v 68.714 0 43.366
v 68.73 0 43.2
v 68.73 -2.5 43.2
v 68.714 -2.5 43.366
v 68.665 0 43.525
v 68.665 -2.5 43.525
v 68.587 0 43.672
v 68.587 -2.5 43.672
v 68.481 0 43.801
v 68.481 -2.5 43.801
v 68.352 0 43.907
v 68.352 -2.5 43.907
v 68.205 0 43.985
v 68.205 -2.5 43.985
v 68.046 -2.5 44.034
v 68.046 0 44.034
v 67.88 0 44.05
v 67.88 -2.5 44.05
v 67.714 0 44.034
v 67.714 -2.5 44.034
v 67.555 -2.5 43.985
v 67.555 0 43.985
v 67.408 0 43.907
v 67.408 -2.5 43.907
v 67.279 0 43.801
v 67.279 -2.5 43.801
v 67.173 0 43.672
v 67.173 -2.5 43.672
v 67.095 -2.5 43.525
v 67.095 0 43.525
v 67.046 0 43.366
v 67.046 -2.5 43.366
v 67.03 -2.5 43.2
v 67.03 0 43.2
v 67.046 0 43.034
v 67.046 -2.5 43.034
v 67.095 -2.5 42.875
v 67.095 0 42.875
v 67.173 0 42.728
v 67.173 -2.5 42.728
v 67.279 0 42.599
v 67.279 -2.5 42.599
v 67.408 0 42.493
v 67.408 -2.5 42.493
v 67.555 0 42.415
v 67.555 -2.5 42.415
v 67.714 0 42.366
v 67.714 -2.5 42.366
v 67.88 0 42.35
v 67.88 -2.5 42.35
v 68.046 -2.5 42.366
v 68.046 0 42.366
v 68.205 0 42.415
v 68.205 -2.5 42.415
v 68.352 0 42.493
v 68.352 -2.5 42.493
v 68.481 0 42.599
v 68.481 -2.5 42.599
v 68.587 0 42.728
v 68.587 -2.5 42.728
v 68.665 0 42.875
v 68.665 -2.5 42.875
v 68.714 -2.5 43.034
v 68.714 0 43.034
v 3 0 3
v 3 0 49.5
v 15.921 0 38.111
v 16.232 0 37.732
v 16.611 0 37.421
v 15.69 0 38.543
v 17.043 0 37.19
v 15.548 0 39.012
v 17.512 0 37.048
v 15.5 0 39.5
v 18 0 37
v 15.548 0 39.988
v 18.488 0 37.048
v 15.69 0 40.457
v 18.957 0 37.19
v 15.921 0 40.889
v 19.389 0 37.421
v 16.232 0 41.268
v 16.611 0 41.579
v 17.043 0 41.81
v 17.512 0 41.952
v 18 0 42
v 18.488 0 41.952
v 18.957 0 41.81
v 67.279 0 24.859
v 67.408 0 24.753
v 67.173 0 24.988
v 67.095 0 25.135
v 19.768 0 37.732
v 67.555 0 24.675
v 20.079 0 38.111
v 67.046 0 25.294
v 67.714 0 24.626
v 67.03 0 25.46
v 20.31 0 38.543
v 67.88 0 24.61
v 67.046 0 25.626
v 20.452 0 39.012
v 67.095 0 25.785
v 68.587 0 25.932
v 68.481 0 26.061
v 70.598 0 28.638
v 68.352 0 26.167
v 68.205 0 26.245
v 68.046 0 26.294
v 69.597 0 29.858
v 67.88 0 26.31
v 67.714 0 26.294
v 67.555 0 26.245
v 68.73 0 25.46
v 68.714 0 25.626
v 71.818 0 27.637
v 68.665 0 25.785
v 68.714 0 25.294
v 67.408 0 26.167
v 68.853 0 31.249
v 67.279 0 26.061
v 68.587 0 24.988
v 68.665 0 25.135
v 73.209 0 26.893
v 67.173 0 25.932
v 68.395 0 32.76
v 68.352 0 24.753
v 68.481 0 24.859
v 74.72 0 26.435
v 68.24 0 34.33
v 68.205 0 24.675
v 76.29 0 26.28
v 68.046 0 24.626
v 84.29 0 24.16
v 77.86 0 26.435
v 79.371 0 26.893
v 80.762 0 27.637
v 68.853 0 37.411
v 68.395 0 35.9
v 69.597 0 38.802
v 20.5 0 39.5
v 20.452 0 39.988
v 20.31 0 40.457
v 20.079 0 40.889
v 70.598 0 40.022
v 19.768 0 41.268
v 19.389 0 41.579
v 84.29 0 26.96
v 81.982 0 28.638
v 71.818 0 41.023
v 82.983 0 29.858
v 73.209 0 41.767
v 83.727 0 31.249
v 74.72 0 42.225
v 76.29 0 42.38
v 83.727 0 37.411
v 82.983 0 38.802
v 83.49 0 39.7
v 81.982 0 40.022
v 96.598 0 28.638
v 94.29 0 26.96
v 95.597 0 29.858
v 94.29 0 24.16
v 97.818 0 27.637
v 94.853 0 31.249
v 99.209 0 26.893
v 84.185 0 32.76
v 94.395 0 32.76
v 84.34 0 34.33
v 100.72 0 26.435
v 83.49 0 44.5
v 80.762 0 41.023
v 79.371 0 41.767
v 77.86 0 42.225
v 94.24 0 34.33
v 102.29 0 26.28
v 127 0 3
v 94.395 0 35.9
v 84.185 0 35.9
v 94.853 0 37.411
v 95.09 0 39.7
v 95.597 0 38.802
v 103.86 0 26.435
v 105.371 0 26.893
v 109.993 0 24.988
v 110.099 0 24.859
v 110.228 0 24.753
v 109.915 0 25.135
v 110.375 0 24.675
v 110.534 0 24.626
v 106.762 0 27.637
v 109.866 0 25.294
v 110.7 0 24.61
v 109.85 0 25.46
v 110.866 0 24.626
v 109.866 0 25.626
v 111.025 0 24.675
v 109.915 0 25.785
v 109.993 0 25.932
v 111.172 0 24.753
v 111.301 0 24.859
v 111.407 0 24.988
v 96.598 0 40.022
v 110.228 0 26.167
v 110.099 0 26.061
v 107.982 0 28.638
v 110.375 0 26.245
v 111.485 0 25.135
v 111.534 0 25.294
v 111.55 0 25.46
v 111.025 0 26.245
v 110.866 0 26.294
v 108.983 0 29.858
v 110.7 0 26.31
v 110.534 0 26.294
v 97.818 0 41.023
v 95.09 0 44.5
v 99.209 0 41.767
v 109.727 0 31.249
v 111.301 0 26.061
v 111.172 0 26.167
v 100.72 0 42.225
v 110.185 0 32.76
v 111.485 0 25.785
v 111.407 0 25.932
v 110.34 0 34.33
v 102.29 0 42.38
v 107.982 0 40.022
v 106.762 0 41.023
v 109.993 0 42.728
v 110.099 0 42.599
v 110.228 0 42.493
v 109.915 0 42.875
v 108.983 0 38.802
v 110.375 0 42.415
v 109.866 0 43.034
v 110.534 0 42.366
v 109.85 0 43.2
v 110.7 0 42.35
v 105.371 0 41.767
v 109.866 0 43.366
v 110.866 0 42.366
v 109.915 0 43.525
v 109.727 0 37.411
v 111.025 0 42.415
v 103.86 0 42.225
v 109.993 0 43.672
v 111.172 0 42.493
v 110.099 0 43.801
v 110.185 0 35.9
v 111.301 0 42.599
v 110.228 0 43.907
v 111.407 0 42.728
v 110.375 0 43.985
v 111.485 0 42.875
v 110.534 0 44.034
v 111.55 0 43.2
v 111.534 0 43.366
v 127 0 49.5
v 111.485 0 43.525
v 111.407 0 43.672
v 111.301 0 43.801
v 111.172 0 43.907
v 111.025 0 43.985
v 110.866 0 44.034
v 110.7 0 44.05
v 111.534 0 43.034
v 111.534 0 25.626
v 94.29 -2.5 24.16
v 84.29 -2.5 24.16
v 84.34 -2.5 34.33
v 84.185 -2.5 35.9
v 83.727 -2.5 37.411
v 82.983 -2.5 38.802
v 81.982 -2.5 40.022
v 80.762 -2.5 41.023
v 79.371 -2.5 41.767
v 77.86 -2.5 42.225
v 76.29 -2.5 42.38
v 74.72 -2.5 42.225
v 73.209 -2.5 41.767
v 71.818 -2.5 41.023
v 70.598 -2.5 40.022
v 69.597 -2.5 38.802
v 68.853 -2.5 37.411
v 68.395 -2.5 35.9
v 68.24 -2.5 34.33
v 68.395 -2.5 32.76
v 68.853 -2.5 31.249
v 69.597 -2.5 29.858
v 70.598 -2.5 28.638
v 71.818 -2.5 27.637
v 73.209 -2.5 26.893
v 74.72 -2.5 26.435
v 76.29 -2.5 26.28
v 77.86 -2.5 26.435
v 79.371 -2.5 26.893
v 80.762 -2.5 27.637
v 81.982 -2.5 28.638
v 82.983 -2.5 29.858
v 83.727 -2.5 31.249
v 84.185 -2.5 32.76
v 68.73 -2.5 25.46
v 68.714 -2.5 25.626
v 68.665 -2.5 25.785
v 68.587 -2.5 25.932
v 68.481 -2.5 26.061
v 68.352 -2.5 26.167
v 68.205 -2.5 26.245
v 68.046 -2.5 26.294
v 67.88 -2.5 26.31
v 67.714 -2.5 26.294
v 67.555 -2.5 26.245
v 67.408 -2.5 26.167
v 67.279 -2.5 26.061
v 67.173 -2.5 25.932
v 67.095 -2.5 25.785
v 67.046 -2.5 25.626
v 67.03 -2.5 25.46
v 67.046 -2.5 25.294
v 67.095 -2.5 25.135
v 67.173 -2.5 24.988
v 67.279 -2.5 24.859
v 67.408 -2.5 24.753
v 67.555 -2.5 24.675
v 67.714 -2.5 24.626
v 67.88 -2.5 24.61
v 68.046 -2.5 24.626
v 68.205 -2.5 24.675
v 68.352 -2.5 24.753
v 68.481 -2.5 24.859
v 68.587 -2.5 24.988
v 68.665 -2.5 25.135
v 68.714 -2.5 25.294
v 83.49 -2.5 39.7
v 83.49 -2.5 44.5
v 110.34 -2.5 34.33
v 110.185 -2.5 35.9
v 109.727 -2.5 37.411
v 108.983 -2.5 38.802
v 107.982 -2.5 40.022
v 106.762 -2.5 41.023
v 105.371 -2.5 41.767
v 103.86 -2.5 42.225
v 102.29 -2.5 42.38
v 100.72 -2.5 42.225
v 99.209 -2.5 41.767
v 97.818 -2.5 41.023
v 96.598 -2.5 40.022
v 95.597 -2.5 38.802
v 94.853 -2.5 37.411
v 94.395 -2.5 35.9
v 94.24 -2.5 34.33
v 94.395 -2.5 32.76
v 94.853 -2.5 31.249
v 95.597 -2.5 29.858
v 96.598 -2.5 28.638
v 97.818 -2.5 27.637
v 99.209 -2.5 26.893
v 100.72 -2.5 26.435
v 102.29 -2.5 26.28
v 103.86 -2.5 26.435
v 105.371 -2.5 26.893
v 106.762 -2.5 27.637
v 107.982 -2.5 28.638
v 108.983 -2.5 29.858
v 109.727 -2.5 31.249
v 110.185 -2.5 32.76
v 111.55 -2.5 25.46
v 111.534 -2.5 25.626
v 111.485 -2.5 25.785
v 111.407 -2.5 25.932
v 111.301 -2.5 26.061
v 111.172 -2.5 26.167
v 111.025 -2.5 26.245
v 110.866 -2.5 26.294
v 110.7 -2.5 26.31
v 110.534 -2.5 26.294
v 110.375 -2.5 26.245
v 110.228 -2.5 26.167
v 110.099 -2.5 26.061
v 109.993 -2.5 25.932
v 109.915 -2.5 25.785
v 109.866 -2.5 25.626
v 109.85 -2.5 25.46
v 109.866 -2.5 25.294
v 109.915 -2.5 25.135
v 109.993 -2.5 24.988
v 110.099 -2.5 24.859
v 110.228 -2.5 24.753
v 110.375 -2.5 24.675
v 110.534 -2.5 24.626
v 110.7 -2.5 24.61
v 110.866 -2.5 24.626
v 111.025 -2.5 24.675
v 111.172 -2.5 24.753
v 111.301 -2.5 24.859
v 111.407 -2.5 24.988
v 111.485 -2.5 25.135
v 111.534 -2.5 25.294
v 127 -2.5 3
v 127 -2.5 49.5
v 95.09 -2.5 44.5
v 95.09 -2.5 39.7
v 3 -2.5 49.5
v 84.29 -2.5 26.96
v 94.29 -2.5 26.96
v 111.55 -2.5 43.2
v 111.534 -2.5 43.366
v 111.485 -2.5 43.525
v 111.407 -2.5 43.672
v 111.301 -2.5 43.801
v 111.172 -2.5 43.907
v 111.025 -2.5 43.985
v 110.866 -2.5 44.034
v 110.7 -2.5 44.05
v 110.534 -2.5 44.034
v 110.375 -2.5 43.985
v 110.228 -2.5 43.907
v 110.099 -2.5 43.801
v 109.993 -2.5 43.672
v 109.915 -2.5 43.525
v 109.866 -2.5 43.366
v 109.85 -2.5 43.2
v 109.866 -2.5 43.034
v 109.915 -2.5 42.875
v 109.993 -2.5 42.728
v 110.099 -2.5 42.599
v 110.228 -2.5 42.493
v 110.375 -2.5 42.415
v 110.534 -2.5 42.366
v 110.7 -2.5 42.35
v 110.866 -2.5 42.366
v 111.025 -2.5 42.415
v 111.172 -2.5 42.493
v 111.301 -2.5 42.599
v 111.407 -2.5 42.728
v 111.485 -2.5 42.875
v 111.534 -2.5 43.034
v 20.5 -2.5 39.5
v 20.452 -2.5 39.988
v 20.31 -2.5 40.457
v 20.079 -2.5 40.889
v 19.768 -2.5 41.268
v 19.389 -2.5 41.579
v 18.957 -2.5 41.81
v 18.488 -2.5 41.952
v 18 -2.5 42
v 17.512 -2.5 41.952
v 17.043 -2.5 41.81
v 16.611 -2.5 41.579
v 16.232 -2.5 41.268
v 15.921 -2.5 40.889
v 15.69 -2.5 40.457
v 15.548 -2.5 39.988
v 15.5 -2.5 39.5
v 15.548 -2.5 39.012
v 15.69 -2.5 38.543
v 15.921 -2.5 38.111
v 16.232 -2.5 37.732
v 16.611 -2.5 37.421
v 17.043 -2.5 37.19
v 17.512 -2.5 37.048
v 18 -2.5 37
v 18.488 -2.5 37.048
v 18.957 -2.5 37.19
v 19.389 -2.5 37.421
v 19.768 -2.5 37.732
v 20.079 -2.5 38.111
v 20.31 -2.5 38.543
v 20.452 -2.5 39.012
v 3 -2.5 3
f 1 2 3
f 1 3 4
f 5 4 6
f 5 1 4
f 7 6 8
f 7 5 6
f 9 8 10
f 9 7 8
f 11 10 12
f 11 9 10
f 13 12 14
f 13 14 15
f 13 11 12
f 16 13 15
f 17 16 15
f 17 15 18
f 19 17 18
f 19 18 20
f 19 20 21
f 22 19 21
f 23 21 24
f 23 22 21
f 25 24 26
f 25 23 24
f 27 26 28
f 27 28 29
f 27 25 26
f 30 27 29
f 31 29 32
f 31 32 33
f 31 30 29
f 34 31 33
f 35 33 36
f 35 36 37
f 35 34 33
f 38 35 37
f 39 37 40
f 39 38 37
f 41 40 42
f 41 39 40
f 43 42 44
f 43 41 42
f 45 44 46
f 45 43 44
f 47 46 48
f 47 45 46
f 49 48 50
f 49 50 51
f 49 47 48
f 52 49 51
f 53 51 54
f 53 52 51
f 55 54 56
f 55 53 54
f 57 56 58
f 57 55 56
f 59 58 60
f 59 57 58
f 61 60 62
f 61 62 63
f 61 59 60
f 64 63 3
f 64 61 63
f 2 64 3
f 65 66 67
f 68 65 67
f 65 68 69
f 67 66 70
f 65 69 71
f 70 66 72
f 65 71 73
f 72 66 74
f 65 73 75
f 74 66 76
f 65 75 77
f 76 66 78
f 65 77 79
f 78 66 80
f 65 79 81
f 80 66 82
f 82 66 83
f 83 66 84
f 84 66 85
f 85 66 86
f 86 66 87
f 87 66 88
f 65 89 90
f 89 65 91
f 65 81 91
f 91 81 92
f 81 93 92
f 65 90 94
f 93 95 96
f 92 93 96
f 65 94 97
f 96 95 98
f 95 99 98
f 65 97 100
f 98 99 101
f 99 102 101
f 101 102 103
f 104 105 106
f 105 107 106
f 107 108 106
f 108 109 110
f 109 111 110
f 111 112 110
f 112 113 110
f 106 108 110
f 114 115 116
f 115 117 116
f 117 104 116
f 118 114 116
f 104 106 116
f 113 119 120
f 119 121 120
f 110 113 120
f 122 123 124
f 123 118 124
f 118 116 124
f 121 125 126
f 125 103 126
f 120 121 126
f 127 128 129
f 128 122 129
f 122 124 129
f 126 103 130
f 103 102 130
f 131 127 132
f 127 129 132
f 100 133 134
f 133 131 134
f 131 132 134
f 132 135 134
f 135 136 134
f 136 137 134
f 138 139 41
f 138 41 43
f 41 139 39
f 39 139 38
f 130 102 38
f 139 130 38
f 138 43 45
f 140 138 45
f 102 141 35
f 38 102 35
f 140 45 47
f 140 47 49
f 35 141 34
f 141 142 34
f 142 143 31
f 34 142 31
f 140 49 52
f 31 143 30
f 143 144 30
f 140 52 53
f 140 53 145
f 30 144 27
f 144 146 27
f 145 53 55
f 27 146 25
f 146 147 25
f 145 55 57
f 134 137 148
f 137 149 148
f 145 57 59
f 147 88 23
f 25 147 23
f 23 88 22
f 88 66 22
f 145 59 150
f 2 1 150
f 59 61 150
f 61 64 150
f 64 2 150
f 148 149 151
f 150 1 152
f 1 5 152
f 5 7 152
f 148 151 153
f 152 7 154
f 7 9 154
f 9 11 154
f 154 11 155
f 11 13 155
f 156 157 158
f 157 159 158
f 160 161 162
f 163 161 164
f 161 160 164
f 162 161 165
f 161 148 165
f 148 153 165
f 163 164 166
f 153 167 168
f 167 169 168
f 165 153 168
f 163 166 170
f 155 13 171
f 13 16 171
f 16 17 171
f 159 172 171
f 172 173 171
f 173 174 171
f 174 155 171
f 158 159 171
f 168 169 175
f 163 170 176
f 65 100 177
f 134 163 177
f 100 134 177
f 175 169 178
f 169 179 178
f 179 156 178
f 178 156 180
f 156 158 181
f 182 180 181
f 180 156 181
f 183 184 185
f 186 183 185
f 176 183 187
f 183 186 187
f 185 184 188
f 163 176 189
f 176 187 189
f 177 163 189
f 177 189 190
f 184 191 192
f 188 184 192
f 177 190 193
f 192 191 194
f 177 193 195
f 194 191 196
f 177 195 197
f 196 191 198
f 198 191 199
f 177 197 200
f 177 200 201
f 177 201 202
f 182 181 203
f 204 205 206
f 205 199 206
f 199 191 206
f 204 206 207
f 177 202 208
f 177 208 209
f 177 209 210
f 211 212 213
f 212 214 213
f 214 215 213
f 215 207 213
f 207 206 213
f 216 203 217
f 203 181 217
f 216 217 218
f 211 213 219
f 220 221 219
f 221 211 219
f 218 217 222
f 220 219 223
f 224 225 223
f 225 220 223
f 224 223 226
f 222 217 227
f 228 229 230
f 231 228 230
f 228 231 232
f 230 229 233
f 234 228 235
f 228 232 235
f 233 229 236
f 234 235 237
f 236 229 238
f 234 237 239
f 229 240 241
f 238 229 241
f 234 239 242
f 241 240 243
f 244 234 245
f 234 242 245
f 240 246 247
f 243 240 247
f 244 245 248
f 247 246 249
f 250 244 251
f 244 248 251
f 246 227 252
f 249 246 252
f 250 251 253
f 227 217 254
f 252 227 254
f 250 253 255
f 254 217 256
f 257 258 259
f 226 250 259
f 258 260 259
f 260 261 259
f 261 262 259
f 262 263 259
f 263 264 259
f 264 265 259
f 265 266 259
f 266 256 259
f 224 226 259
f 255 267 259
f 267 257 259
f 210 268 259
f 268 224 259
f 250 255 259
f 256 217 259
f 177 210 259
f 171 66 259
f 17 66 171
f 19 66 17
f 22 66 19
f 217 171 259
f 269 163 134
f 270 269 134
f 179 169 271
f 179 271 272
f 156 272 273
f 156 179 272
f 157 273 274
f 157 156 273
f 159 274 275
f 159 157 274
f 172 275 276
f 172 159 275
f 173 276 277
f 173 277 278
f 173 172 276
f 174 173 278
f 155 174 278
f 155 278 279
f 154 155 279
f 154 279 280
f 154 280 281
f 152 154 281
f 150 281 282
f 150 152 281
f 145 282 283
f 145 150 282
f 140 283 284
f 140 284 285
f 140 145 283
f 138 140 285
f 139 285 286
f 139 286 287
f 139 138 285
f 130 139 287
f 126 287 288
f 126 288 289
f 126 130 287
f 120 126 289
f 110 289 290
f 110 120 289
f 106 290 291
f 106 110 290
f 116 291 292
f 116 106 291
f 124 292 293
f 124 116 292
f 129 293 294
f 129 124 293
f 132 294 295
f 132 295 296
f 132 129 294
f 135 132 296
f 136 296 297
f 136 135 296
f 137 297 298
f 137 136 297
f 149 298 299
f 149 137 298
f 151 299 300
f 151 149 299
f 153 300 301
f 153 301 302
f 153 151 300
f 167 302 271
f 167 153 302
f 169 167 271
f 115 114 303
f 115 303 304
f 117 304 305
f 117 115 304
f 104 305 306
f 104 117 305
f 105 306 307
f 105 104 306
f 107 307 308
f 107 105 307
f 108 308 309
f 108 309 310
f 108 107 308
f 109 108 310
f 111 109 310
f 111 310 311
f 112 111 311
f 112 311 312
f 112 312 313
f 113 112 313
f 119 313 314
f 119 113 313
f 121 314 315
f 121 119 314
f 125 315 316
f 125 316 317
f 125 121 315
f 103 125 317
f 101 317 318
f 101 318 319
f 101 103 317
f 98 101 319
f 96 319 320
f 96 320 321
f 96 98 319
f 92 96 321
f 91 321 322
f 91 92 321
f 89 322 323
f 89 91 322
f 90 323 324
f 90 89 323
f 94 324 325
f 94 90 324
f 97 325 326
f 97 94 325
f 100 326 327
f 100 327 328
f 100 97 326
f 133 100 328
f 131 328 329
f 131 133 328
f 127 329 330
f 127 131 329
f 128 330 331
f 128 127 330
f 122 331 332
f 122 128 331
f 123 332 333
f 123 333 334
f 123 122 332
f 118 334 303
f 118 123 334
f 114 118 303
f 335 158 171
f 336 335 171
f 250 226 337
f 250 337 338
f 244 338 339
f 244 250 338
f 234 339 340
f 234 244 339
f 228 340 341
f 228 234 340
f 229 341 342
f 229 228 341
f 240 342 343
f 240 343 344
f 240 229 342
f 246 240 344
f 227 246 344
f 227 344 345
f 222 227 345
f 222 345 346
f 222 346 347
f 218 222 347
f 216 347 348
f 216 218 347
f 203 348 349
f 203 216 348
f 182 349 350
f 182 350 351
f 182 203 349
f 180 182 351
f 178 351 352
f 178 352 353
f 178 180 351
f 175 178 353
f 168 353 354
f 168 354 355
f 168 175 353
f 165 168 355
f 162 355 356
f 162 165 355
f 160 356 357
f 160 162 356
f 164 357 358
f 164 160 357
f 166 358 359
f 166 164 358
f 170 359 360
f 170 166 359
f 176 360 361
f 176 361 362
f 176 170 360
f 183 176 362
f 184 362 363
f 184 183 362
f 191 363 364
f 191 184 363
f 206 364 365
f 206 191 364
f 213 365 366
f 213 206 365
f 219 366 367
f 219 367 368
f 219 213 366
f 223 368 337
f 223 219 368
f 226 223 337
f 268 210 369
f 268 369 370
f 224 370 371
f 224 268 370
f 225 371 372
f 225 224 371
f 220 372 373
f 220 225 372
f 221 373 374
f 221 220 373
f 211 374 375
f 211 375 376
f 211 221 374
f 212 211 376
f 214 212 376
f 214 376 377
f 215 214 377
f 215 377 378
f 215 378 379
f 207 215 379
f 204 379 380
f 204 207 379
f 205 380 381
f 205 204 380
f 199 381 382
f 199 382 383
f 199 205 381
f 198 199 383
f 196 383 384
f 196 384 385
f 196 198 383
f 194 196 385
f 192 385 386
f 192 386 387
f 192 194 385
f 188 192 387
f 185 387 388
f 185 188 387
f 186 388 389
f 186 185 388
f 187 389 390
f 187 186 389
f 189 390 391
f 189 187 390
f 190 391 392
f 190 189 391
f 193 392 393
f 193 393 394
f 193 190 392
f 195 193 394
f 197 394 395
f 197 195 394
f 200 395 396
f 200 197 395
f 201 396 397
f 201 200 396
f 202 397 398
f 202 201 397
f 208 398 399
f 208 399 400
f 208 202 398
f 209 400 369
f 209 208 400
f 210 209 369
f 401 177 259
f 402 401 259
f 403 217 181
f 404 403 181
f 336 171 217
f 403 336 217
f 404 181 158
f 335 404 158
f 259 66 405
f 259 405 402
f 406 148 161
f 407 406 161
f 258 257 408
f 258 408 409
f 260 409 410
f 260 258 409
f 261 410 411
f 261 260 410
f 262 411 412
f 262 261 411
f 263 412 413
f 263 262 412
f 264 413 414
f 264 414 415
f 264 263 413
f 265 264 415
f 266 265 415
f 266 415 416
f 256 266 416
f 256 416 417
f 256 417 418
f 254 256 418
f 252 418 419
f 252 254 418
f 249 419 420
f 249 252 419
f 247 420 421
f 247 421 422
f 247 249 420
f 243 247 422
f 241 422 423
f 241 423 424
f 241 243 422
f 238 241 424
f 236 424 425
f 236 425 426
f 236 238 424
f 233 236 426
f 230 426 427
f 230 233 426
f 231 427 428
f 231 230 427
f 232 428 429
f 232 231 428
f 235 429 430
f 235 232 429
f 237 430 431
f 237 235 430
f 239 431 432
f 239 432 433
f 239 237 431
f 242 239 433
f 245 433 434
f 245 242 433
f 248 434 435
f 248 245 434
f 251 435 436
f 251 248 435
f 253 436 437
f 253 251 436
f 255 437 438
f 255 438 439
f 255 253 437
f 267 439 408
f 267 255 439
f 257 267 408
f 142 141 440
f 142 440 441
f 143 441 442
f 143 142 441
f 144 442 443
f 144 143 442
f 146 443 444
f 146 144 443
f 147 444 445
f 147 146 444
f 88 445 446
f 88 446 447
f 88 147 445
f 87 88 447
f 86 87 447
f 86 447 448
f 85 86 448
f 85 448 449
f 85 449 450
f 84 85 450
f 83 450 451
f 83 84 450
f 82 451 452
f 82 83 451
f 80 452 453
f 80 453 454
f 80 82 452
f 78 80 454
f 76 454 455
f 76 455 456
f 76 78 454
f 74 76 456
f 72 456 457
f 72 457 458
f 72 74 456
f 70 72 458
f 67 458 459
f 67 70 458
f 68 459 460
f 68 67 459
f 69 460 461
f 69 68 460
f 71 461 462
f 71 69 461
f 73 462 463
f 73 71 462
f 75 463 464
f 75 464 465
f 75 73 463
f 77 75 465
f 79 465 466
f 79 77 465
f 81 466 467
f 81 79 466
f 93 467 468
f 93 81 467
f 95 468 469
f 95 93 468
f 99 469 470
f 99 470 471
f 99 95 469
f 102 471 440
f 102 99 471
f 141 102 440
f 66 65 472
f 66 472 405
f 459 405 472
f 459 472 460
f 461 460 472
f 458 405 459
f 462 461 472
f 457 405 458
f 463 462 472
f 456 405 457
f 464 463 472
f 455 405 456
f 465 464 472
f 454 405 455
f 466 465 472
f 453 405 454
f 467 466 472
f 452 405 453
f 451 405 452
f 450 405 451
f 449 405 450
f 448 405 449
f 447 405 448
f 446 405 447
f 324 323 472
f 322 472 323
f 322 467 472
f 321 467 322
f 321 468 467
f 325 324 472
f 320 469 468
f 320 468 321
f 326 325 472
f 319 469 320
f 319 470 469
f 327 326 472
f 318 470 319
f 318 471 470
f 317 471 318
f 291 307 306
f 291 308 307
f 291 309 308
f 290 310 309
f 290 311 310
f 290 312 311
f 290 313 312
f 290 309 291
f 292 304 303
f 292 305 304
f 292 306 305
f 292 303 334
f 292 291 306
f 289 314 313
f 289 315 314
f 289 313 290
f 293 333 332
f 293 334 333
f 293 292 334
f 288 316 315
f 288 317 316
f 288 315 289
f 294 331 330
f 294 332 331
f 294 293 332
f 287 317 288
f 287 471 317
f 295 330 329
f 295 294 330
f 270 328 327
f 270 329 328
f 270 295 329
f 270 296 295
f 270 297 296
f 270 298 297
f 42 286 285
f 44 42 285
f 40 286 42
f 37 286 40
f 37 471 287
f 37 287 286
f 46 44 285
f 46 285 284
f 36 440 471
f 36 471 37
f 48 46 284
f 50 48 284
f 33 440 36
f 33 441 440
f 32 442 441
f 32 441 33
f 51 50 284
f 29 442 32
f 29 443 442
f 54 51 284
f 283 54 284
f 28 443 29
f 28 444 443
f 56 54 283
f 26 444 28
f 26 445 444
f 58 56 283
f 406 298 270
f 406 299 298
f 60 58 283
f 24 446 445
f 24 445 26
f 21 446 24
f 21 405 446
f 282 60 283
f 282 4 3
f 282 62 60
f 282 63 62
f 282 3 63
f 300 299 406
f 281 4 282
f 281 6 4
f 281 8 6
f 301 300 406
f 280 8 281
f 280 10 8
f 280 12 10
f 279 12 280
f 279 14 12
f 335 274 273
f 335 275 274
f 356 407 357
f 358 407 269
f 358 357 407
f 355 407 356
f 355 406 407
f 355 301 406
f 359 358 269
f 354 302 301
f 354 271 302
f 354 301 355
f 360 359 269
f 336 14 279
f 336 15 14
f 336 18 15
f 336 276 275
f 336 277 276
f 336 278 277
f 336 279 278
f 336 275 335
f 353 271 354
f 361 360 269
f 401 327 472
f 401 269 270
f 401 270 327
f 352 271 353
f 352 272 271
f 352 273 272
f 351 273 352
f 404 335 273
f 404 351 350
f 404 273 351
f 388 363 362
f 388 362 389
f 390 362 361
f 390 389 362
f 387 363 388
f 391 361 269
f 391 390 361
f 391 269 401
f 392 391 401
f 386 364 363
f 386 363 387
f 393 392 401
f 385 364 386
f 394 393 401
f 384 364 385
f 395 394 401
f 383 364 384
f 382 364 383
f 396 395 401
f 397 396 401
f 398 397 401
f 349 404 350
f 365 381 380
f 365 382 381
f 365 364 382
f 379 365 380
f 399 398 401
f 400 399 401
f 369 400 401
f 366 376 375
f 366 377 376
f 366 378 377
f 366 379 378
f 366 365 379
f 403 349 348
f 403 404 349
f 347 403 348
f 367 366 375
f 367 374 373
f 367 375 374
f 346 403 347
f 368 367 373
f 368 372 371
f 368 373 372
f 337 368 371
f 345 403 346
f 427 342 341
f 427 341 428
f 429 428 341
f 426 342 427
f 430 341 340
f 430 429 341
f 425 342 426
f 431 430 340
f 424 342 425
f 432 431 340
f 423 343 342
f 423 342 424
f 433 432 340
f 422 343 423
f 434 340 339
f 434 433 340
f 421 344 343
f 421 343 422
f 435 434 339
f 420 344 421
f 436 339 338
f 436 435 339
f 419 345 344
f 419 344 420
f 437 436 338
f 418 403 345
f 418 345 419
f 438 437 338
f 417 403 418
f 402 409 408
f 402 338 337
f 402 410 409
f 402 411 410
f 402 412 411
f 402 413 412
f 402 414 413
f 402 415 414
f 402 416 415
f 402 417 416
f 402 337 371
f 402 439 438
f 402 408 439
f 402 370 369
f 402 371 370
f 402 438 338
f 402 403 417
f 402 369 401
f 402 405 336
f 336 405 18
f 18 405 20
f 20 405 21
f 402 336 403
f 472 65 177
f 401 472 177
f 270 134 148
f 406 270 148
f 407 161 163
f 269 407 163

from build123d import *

# Parameters (mm, degrees)
F0_W     = 124
F0_H     = 46.5
F0_R     = 0.85
F0_R_2   = 2.5
F0_R_3   = 8.05
F1_DEPTH = 2.5


with BuildPart() as f1:
    # F0 (on Front) → F1 (new body)
    with BuildSketch(Plane.XZ):
        with Locations((65, 26.25)):
            Rectangle(F0_W, F0_H)
        with Locations((67.88, 25.46)):
            Circle(F0_R, mode=Mode.SUBTRACT)
        Polygon((84.29, 24.16), (84.29, 26.96), (89.29, 26.96), (94.29, 26.96), (94.29, 24.16), (89.29, 24.16), align=None, mode=Mode.SUBTRACT)
        with Locations((110.7, 25.46)):
            Circle(F0_R, mode=Mode.SUBTRACT)
        with Locations((18, 39.5)):
            Circle(F0_R_2, mode=Mode.SUBTRACT)
        with Locations((76.29, 34.33)):
            Circle(F0_R_3, mode=Mode.SUBTRACT)
        with Locations((102.29, 34.33)):
            Circle(F0_R_3, mode=Mode.SUBTRACT)
        with Locations((67.88, 43.2)):
            Circle(F0_R, mode=Mode.SUBTRACT)
        Polygon((83.49, 39.7), (83.49, 44.5), (89.29, 44.5), (95.09, 44.5), (95.09, 39.7), (89.29, 39.7), align=None, mode=Mode.SUBTRACT)
        with Locations((110.7, 43.2)):
            Circle(F0_R, mode=Mode.SUBTRACT)
    extrude(amount=F1_DEPTH)


solid = f1.part
